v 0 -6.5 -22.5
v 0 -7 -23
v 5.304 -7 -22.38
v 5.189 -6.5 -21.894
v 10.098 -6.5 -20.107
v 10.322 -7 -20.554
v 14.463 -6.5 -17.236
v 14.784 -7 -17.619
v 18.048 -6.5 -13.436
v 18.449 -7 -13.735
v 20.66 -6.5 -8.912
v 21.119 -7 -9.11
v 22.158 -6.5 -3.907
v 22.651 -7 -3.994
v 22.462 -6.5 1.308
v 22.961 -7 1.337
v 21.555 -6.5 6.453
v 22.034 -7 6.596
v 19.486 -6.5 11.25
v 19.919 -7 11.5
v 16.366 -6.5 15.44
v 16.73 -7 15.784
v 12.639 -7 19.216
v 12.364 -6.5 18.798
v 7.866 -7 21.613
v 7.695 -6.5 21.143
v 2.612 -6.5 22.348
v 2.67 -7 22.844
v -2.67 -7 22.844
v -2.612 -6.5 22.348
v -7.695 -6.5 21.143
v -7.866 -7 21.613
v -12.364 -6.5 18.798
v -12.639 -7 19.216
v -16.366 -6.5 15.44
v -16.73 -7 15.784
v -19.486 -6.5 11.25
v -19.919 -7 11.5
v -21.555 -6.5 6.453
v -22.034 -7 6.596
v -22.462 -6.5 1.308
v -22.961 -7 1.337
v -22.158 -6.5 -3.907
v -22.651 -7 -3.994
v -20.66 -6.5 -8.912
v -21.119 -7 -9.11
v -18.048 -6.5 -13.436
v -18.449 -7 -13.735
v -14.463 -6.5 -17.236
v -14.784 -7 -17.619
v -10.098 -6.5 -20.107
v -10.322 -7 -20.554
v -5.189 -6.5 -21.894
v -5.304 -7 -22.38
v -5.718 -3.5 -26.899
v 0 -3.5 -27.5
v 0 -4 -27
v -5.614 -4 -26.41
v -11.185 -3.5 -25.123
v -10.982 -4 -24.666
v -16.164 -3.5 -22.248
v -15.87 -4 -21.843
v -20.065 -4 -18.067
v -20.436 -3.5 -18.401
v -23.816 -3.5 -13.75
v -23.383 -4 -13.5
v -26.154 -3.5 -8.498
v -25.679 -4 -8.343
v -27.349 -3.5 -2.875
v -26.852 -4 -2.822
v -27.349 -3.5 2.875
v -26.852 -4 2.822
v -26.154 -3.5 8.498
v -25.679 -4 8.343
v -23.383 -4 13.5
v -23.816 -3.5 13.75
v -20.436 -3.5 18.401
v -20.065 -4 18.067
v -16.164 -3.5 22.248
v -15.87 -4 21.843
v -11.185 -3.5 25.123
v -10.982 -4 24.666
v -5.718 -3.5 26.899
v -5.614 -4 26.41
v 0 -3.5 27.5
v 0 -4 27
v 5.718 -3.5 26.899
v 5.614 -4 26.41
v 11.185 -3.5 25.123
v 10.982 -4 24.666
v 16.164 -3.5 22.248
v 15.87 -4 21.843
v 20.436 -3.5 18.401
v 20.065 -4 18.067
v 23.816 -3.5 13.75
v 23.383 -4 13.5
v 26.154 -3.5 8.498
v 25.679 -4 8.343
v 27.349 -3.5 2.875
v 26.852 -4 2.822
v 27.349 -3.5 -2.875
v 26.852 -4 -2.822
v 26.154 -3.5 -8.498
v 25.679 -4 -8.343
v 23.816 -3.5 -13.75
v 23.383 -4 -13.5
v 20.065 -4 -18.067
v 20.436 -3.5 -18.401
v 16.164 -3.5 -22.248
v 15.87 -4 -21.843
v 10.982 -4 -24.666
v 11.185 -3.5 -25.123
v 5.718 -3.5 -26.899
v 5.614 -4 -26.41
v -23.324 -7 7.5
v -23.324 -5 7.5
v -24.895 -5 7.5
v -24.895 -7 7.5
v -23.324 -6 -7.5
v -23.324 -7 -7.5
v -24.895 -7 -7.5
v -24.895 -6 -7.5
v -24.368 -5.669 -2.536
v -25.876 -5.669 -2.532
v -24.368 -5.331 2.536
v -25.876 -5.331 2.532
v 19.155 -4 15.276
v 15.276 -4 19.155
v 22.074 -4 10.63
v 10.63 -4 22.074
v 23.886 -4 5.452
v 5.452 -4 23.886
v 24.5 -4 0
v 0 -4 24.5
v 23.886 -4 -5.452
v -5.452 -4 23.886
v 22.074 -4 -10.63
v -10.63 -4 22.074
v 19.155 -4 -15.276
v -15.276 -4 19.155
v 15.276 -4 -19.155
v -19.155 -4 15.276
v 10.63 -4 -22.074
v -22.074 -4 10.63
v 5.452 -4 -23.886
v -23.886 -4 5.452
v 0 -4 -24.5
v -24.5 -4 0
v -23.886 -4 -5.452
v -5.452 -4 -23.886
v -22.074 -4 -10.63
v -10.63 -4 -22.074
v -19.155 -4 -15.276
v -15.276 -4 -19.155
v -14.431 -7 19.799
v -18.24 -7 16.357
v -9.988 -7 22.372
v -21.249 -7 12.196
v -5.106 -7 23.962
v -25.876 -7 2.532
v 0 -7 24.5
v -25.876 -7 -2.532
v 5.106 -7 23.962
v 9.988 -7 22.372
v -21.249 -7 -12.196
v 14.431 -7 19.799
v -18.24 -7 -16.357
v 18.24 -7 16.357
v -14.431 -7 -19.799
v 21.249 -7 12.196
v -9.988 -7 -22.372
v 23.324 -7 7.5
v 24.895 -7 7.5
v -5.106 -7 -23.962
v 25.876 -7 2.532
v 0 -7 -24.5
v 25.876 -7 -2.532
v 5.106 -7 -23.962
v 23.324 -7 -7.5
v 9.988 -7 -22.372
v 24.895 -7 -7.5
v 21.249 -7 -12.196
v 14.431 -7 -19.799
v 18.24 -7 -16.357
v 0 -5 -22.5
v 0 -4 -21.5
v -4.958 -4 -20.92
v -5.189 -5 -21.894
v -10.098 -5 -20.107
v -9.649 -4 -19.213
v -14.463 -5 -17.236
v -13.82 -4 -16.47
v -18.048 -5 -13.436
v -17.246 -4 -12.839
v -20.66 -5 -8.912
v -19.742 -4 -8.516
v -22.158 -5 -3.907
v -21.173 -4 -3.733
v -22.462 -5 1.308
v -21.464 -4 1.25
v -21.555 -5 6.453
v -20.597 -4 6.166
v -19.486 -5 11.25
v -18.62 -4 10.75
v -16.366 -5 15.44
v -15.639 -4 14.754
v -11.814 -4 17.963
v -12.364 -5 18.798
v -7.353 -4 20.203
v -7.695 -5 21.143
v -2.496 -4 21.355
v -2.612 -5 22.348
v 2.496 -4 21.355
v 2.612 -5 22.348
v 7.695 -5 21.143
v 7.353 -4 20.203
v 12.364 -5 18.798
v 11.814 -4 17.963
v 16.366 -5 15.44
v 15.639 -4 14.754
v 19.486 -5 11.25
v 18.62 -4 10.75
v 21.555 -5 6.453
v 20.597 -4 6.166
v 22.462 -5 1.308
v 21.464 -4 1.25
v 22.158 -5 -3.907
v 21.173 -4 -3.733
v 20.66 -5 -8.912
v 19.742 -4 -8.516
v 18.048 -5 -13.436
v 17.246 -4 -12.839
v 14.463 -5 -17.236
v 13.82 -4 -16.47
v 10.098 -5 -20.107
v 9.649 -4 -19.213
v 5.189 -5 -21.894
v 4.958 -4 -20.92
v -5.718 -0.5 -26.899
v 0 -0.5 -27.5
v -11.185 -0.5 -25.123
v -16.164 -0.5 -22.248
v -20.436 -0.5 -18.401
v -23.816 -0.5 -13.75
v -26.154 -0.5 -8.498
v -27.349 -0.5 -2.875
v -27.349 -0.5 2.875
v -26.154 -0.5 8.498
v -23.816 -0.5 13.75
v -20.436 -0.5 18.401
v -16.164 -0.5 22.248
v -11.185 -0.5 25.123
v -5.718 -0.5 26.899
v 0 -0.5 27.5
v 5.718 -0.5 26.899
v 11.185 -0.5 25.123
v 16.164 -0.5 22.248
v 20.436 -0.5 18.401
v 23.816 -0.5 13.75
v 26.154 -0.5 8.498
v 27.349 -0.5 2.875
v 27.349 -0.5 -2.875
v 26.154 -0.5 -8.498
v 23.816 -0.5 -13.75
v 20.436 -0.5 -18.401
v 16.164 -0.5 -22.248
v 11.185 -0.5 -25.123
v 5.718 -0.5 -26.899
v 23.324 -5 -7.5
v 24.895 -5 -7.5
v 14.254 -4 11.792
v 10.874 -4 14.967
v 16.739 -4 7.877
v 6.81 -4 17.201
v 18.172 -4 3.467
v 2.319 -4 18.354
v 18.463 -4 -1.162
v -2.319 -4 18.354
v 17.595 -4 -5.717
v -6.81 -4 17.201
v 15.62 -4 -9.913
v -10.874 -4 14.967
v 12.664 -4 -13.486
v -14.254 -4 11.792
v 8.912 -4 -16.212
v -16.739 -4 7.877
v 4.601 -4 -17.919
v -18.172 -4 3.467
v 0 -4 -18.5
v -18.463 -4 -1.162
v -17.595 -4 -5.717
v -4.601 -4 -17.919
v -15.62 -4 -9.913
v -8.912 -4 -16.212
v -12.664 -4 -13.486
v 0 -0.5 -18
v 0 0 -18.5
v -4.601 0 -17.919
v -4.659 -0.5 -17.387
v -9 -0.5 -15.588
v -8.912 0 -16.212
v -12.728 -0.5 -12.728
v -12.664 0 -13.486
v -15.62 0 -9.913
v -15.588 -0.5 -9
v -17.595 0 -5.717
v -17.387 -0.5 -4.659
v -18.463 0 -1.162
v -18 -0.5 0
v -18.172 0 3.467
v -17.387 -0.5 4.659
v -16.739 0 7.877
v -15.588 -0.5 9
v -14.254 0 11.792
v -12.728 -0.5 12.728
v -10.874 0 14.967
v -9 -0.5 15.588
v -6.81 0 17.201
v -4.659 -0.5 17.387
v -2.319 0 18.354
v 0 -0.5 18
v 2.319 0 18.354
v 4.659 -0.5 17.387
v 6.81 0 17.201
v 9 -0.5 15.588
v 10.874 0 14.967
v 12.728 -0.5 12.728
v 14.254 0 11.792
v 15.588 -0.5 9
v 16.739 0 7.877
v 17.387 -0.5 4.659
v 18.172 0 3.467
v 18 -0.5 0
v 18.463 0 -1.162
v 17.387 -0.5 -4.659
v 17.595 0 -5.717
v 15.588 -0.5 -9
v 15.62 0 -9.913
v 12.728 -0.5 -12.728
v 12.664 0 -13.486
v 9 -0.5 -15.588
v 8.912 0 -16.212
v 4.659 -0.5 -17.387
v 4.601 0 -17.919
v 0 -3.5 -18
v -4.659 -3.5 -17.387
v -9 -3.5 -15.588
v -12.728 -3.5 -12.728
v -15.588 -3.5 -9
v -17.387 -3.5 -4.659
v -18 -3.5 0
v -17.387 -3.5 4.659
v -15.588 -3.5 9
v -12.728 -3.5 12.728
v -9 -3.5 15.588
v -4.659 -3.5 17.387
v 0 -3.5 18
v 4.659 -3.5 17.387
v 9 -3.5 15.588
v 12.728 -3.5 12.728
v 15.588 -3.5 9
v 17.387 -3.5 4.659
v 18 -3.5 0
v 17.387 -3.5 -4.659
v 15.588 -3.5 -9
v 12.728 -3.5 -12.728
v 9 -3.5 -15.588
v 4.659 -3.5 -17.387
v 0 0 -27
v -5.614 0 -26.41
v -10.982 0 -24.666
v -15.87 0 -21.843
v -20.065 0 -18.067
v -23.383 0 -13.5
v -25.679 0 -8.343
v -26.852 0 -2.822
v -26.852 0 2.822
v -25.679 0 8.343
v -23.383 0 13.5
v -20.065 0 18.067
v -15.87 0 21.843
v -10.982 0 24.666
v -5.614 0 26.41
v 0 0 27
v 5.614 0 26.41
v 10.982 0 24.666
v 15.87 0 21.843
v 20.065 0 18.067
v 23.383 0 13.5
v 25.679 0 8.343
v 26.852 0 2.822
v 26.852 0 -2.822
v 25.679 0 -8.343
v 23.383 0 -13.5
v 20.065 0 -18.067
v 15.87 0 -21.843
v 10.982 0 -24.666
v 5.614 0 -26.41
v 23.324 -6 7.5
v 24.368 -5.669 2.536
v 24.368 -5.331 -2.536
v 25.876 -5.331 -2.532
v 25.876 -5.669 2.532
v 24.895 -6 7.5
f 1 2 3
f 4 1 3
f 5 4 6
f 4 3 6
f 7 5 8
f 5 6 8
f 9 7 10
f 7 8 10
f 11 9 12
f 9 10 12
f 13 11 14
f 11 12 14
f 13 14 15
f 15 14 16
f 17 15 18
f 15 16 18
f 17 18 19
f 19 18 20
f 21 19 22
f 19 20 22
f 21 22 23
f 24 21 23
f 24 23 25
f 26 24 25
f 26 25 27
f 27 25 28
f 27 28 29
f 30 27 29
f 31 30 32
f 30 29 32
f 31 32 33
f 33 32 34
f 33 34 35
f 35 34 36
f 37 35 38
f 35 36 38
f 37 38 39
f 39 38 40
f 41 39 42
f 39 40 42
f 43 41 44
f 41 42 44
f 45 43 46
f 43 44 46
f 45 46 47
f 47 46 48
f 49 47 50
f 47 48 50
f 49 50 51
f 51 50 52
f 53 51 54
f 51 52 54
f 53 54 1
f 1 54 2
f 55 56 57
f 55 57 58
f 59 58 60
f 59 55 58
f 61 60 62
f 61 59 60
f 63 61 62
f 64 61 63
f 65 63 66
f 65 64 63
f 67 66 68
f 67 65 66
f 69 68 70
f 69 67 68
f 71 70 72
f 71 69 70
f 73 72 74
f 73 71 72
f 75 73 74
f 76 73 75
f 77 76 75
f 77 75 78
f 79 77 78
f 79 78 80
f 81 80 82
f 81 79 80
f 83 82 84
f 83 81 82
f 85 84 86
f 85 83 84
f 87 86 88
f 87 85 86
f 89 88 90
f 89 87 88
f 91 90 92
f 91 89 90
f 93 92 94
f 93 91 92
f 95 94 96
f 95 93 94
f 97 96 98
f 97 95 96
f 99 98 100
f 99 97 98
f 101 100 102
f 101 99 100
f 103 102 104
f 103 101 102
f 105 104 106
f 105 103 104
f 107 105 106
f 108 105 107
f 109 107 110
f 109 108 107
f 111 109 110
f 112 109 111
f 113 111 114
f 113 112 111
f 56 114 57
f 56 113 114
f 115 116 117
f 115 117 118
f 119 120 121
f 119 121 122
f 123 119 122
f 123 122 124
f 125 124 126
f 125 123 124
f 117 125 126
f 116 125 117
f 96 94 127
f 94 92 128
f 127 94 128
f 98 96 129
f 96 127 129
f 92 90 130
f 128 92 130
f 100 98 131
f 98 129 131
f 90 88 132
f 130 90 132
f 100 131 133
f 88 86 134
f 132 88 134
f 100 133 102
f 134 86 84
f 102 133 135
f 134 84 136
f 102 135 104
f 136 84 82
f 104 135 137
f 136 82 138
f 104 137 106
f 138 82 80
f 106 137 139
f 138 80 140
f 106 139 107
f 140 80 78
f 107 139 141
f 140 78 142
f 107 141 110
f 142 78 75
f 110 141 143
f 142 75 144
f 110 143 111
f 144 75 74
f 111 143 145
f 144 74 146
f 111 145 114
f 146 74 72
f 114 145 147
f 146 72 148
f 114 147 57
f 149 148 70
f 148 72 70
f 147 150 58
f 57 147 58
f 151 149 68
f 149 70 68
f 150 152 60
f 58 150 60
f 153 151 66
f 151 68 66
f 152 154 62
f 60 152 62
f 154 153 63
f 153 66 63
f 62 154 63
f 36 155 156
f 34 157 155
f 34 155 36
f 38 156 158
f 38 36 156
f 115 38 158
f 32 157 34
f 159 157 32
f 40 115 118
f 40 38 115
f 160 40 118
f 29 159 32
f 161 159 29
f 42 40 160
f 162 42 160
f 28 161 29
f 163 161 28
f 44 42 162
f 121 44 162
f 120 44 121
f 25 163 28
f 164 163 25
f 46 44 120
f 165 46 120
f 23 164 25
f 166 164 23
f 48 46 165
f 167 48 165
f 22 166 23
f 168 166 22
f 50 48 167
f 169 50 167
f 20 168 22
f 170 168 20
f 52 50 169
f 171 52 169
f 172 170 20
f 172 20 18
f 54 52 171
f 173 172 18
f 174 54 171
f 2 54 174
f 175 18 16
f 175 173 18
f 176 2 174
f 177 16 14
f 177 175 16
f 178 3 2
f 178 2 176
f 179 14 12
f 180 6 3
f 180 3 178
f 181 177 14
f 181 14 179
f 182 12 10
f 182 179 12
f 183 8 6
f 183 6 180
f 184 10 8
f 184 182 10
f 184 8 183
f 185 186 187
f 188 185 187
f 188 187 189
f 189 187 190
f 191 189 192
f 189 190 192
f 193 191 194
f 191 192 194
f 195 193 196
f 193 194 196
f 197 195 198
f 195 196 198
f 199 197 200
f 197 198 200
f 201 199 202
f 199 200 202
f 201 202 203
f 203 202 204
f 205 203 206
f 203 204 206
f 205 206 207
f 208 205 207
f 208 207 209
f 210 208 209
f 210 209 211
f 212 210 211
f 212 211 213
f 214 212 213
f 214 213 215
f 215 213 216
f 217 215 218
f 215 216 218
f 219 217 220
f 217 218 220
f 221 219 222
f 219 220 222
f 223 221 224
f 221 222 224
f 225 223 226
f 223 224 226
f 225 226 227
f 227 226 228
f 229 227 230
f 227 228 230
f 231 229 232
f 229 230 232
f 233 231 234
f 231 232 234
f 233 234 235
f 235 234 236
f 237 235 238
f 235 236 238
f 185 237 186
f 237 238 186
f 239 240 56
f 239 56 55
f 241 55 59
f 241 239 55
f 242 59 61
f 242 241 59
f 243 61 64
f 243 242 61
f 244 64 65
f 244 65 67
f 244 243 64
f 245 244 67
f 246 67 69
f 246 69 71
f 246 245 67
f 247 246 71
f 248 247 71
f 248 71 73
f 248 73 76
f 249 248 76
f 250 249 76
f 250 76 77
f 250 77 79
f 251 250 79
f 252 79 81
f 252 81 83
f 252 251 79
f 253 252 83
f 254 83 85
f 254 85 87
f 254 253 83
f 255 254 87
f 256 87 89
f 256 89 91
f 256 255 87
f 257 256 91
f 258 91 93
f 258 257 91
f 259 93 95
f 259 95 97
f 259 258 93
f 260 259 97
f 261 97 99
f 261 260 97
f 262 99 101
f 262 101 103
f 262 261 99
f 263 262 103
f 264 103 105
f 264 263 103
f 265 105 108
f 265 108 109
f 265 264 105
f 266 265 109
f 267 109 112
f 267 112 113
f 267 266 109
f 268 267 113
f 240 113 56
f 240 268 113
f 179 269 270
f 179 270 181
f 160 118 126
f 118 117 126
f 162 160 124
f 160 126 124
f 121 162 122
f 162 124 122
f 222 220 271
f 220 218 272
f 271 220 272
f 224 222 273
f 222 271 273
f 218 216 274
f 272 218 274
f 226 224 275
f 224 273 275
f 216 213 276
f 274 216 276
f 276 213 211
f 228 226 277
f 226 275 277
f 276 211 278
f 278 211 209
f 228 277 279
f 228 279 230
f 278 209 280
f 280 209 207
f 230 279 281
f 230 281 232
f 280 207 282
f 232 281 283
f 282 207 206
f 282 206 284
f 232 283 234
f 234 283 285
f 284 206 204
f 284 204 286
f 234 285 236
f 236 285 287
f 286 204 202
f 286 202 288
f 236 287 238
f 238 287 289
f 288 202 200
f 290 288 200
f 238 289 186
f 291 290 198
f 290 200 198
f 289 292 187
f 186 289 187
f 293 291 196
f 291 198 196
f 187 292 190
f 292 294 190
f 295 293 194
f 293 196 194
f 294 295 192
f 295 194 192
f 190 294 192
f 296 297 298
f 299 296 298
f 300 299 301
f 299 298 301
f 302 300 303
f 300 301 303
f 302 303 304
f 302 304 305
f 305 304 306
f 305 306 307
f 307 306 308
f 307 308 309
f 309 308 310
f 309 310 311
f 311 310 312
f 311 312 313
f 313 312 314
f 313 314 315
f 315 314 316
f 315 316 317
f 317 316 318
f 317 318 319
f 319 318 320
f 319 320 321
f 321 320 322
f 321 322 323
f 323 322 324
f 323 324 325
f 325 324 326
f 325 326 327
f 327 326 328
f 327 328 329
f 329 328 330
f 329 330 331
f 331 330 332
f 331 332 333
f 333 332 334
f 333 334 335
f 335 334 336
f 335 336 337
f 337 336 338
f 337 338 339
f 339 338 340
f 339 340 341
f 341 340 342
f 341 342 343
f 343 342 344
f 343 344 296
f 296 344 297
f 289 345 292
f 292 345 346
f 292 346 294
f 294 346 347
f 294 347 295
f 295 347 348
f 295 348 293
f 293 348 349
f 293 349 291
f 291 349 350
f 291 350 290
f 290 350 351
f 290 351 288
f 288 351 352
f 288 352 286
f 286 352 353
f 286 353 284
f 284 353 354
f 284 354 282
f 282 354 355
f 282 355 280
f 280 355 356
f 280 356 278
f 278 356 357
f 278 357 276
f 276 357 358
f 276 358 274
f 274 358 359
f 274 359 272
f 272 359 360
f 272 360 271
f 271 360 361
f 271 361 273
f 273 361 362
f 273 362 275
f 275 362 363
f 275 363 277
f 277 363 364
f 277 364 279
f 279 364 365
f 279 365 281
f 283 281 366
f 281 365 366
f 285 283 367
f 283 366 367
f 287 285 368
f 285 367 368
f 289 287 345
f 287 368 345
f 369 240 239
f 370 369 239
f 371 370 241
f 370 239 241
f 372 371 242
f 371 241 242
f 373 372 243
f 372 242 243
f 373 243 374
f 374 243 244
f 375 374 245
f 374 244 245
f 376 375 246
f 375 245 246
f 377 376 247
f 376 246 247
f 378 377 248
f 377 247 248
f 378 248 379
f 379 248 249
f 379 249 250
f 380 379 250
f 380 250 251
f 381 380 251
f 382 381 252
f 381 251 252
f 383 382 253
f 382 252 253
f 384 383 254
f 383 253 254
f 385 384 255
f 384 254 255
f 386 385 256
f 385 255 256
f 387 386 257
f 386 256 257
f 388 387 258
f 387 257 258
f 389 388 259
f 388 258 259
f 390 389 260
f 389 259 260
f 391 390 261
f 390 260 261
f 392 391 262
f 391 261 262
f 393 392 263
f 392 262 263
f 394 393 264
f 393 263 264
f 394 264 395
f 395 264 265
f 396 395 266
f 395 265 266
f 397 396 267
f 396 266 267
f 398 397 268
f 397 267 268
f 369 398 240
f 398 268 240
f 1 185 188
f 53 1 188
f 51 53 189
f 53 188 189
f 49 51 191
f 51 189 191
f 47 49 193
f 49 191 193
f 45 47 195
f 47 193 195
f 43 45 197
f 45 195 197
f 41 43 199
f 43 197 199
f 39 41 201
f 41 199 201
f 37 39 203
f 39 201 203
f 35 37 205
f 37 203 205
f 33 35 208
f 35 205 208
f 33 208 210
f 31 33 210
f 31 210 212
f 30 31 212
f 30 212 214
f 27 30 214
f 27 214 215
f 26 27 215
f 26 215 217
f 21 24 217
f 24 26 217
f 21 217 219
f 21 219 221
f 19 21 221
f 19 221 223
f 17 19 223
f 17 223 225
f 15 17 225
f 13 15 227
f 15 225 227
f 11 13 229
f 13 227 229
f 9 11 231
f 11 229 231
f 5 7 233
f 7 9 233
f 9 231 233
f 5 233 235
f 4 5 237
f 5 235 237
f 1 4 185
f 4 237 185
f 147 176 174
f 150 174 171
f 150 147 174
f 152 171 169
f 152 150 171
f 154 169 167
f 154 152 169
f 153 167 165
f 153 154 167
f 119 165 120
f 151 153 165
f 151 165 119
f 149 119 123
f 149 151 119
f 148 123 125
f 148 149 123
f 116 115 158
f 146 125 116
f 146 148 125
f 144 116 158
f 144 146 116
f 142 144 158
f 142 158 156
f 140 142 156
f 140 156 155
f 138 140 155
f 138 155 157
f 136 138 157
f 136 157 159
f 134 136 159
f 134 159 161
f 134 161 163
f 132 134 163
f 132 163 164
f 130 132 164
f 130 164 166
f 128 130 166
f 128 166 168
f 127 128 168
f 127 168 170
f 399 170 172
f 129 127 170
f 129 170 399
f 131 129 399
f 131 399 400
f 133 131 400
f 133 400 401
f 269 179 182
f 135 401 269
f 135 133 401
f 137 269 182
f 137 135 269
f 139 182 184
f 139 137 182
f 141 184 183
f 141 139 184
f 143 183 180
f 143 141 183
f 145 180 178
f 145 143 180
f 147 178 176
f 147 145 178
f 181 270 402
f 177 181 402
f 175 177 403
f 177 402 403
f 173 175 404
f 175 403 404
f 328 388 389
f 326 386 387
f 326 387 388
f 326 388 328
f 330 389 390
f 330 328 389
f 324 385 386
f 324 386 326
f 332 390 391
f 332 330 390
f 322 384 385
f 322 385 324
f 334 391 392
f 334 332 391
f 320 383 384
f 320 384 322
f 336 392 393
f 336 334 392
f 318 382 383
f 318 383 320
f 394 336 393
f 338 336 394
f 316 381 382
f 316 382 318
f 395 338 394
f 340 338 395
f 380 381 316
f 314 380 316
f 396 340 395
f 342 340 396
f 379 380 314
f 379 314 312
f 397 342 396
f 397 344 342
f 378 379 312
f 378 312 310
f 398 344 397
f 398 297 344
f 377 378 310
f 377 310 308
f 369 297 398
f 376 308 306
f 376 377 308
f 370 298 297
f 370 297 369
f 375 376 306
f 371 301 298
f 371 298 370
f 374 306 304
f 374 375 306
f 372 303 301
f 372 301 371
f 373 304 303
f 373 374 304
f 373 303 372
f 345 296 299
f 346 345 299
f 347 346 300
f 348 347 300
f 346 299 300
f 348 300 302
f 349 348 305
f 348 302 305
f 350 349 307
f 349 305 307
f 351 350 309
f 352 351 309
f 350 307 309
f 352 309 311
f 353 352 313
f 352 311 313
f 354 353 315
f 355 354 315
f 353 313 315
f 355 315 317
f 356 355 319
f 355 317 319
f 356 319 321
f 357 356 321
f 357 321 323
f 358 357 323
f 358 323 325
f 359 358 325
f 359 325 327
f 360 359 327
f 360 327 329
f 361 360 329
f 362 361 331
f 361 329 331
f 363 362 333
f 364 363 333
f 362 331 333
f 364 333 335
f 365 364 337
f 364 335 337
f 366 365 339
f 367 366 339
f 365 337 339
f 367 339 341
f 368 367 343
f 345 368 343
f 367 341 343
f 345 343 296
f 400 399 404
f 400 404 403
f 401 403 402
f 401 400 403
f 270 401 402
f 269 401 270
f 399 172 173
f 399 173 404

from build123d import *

# Parameters (mm, degrees)
SKIZZE1_W                       = 9.5
SKIZZE1_H                       = 4
SKIZZE1_W_2                     = 2
SKIZZE1_H_2                     = 3
AUFSATZ_LINEAR_AUSTRAGEN4_DEPTH = 30
KREISMUSTER3_COUNT              = 2
SKIZZE3_W                       = 14
SKIZZE3_H                       = 3
SKIZZE3_W_2                     = 22.5
FASE1_SIZE                      = 1
FASE2_SIZE                      = 0.5


with BuildPart() as part:
    # Skizze1 → Rotation1 (revolve)
    with BuildSketch(Plane.XY, mode=Mode.PRIVATE) as rotation1_sk:
        with Locations((-22.75, -2)):
            Rectangle(SKIZZE1_W, SKIZZE1_H)
        with Locations((-23.5, -5.5)):
            Rectangle(SKIZZE1_W_2, SKIZZE1_H_2)
    revolve(rotation1_sk.sketch.rotate(Axis((0, -13.508693245, 0), (0, 1, 0)), 270), axis=Axis((0, -13.508693245, 0), (0, 1, 0)))

    # Skizze2 → Aufsatz-Linear austragen4 (add)
    with BuildSketch(Plane(origin=(0, 0, 0), x_dir=(0, 0, -1), z_dir=(1, 0, 0))):
        Polygon((-7.5, -7), (-7.5, -6), (7.5, -5), (7.5, -7), align=None)
    aufsatz_linear_austragen4 = extrude(amount=AUFSATZ_LINEAR_AUSTRAGEN4_DEPTH)

    # Kreismuster3: Aufsatz-Linear austragen4 ×2 about axis
    kreismuster3_axis = Axis((0, 0, 0), (0, 1, 0))
    for i in range(1, KREISMUSTER3_COUNT):
        add(aufsatz_linear_austragen4.rotate(kreismuster3_axis, i * 360 / KREISMUSTER3_COUNT))

    # Skizze3 → Schnitt-Rotation1 (revolve, cut)
    with BuildSketch(Plane.XY, mode=Mode.PRIVATE) as schnitt_rotation1_sk:
        with Locations((-33, -5.5)):
            Rectangle(SKIZZE3_W, SKIZZE3_H)
        with Locations((-11.25, -5.5)):
            Rectangle(SKIZZE3_W_2, SKIZZE3_H)
    revolve(schnitt_rotation1_sk.sketch.rotate(Axis((0, 1.410628136, 0), (0, -1, 0)), 90), axis=Axis((0, 1.410628136, 0), (0, -1, 0)), mode=Mode.SUBTRACT)

    # Fase1
    fase1_edges = [part.edges().sort_by_distance(p)[0] for p in [
        (0, -4, 22.5),
    ]]
    chamfer(fase1_edges, length=FASE1_SIZE)

    # Fase2
    fase2_edges = [part.edges().sort_by_distance(p)[0] for p in [
        (0, 0, 27.5),
        (0, -7, 22.5),
        (0, 0, 18),
        (0, -4, 18),
        (0, -4, 27.5),
    ]]
    chamfer(fase2_edges, length=FASE2_SIZE)


solid = part.part
